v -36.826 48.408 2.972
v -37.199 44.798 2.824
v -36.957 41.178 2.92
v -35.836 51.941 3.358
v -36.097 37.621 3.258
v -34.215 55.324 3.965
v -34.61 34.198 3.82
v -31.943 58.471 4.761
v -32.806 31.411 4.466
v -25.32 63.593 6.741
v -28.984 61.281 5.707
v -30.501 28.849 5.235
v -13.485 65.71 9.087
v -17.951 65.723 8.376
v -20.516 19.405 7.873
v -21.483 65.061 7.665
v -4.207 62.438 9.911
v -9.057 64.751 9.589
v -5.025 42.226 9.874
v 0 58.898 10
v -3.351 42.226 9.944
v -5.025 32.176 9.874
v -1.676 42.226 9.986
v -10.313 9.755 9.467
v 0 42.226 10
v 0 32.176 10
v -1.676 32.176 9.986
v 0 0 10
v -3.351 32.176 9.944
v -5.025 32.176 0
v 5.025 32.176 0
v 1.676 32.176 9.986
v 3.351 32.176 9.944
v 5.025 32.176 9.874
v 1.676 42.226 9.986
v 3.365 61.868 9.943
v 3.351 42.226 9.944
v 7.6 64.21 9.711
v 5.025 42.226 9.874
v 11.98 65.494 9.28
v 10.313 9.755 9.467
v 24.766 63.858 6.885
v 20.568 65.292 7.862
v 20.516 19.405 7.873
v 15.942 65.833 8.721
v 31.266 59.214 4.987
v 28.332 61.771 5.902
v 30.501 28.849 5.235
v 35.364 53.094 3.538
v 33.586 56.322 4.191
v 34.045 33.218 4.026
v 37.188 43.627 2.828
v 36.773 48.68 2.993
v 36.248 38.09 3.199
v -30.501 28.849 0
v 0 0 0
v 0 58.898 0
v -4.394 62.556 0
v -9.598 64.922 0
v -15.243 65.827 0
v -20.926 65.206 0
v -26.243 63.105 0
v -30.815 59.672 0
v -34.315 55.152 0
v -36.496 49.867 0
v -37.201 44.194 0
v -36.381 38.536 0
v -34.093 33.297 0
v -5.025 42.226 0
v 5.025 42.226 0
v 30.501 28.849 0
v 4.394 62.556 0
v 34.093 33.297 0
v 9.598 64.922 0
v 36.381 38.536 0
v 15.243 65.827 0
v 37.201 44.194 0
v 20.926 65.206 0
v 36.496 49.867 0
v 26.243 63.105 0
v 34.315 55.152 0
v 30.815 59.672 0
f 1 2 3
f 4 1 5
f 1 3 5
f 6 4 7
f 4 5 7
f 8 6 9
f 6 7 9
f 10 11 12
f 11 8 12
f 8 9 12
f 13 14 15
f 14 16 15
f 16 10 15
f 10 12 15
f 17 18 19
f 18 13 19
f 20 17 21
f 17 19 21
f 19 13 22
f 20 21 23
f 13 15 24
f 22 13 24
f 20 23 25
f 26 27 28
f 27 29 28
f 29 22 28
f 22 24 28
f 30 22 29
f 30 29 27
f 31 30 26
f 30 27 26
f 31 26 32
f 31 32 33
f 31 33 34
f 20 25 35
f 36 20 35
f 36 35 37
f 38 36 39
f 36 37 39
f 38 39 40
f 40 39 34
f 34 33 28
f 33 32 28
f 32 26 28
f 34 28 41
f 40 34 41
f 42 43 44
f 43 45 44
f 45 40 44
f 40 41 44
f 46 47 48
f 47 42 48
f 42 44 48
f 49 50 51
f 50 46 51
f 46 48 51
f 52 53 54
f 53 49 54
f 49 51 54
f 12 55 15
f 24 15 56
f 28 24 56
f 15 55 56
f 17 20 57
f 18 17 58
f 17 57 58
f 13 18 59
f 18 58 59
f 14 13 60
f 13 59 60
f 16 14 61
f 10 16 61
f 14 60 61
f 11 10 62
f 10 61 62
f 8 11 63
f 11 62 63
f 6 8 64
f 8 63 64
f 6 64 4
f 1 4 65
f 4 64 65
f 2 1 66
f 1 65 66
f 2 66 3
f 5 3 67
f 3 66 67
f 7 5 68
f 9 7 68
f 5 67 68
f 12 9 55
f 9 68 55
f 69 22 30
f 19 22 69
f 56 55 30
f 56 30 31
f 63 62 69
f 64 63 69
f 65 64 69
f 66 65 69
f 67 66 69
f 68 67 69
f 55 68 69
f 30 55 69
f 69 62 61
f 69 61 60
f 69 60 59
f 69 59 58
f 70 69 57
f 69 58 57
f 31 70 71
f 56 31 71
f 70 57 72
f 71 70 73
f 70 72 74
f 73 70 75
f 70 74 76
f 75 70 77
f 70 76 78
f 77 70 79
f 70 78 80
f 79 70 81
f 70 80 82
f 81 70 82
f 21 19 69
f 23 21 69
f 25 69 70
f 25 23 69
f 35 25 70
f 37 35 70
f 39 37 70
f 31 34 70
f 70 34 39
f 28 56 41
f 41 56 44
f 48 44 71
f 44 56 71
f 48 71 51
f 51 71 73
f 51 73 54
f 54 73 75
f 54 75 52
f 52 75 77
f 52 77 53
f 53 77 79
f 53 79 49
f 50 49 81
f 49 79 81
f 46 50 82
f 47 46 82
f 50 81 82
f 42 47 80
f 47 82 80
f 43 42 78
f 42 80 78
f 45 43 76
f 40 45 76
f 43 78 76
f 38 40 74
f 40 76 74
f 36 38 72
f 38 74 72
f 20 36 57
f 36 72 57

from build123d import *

# Parameters (mm, degrees)
F1_DEPTH = 10
F2_R     = 135.50038
F3_DEPTH = 134
F4_W     = 10.05
F4_H     = 10.05
F5_DEPTH = 12.5


with BuildPart() as f1:
    # F0 (on Top) → F1 (new body)
    with BuildSketch(Plane.XY):
        with BuildLine():
            Line((-30.500877, 28.849207), (0, 0))
            Line((0, 0), (0, 58.898218))
            ThreePointArc((0, 58.898218), (-30.814656, 59.67198), (-30.500877, 28.849207))
        make_face()
        with BuildLine():
            Line((0, 58.898218), (0, 0))
            Line((0, 0), (30.500877, 28.849207))
            ThreePointArc((30.500877, 28.849207), (30.814656, 59.67198), (0, 58.898218))
        make_face()
    extrude(amount=F1_DEPTH)

    # F2 (on Front) → F3 (cut)
    with BuildSketch(Plane.XZ):
        with Locations((0, -90)):
            Circle(F2_R)
        with BuildLine():
            ThreePointArc((0, 10), (70.710678, -19.289322), (100, -90))
            ThreePointArc((100, -90), (-70.710678, -160.710678), (0, 10))
        make_face(mode=Mode.SUBTRACT)
    extrude(amount=-F3_DEPTH, mode=Mode.SUBTRACT)

    # F4 (on Top) → F5 (cut, symmetric)
    with BuildSketch(Plane.XY):
        with Locations((0, 37.200861)):
            Rectangle(F4_W, F4_H)
    extrude(amount=F5_DEPTH, both=True, mode=Mode.SUBTRACT)


solid = f1.part
